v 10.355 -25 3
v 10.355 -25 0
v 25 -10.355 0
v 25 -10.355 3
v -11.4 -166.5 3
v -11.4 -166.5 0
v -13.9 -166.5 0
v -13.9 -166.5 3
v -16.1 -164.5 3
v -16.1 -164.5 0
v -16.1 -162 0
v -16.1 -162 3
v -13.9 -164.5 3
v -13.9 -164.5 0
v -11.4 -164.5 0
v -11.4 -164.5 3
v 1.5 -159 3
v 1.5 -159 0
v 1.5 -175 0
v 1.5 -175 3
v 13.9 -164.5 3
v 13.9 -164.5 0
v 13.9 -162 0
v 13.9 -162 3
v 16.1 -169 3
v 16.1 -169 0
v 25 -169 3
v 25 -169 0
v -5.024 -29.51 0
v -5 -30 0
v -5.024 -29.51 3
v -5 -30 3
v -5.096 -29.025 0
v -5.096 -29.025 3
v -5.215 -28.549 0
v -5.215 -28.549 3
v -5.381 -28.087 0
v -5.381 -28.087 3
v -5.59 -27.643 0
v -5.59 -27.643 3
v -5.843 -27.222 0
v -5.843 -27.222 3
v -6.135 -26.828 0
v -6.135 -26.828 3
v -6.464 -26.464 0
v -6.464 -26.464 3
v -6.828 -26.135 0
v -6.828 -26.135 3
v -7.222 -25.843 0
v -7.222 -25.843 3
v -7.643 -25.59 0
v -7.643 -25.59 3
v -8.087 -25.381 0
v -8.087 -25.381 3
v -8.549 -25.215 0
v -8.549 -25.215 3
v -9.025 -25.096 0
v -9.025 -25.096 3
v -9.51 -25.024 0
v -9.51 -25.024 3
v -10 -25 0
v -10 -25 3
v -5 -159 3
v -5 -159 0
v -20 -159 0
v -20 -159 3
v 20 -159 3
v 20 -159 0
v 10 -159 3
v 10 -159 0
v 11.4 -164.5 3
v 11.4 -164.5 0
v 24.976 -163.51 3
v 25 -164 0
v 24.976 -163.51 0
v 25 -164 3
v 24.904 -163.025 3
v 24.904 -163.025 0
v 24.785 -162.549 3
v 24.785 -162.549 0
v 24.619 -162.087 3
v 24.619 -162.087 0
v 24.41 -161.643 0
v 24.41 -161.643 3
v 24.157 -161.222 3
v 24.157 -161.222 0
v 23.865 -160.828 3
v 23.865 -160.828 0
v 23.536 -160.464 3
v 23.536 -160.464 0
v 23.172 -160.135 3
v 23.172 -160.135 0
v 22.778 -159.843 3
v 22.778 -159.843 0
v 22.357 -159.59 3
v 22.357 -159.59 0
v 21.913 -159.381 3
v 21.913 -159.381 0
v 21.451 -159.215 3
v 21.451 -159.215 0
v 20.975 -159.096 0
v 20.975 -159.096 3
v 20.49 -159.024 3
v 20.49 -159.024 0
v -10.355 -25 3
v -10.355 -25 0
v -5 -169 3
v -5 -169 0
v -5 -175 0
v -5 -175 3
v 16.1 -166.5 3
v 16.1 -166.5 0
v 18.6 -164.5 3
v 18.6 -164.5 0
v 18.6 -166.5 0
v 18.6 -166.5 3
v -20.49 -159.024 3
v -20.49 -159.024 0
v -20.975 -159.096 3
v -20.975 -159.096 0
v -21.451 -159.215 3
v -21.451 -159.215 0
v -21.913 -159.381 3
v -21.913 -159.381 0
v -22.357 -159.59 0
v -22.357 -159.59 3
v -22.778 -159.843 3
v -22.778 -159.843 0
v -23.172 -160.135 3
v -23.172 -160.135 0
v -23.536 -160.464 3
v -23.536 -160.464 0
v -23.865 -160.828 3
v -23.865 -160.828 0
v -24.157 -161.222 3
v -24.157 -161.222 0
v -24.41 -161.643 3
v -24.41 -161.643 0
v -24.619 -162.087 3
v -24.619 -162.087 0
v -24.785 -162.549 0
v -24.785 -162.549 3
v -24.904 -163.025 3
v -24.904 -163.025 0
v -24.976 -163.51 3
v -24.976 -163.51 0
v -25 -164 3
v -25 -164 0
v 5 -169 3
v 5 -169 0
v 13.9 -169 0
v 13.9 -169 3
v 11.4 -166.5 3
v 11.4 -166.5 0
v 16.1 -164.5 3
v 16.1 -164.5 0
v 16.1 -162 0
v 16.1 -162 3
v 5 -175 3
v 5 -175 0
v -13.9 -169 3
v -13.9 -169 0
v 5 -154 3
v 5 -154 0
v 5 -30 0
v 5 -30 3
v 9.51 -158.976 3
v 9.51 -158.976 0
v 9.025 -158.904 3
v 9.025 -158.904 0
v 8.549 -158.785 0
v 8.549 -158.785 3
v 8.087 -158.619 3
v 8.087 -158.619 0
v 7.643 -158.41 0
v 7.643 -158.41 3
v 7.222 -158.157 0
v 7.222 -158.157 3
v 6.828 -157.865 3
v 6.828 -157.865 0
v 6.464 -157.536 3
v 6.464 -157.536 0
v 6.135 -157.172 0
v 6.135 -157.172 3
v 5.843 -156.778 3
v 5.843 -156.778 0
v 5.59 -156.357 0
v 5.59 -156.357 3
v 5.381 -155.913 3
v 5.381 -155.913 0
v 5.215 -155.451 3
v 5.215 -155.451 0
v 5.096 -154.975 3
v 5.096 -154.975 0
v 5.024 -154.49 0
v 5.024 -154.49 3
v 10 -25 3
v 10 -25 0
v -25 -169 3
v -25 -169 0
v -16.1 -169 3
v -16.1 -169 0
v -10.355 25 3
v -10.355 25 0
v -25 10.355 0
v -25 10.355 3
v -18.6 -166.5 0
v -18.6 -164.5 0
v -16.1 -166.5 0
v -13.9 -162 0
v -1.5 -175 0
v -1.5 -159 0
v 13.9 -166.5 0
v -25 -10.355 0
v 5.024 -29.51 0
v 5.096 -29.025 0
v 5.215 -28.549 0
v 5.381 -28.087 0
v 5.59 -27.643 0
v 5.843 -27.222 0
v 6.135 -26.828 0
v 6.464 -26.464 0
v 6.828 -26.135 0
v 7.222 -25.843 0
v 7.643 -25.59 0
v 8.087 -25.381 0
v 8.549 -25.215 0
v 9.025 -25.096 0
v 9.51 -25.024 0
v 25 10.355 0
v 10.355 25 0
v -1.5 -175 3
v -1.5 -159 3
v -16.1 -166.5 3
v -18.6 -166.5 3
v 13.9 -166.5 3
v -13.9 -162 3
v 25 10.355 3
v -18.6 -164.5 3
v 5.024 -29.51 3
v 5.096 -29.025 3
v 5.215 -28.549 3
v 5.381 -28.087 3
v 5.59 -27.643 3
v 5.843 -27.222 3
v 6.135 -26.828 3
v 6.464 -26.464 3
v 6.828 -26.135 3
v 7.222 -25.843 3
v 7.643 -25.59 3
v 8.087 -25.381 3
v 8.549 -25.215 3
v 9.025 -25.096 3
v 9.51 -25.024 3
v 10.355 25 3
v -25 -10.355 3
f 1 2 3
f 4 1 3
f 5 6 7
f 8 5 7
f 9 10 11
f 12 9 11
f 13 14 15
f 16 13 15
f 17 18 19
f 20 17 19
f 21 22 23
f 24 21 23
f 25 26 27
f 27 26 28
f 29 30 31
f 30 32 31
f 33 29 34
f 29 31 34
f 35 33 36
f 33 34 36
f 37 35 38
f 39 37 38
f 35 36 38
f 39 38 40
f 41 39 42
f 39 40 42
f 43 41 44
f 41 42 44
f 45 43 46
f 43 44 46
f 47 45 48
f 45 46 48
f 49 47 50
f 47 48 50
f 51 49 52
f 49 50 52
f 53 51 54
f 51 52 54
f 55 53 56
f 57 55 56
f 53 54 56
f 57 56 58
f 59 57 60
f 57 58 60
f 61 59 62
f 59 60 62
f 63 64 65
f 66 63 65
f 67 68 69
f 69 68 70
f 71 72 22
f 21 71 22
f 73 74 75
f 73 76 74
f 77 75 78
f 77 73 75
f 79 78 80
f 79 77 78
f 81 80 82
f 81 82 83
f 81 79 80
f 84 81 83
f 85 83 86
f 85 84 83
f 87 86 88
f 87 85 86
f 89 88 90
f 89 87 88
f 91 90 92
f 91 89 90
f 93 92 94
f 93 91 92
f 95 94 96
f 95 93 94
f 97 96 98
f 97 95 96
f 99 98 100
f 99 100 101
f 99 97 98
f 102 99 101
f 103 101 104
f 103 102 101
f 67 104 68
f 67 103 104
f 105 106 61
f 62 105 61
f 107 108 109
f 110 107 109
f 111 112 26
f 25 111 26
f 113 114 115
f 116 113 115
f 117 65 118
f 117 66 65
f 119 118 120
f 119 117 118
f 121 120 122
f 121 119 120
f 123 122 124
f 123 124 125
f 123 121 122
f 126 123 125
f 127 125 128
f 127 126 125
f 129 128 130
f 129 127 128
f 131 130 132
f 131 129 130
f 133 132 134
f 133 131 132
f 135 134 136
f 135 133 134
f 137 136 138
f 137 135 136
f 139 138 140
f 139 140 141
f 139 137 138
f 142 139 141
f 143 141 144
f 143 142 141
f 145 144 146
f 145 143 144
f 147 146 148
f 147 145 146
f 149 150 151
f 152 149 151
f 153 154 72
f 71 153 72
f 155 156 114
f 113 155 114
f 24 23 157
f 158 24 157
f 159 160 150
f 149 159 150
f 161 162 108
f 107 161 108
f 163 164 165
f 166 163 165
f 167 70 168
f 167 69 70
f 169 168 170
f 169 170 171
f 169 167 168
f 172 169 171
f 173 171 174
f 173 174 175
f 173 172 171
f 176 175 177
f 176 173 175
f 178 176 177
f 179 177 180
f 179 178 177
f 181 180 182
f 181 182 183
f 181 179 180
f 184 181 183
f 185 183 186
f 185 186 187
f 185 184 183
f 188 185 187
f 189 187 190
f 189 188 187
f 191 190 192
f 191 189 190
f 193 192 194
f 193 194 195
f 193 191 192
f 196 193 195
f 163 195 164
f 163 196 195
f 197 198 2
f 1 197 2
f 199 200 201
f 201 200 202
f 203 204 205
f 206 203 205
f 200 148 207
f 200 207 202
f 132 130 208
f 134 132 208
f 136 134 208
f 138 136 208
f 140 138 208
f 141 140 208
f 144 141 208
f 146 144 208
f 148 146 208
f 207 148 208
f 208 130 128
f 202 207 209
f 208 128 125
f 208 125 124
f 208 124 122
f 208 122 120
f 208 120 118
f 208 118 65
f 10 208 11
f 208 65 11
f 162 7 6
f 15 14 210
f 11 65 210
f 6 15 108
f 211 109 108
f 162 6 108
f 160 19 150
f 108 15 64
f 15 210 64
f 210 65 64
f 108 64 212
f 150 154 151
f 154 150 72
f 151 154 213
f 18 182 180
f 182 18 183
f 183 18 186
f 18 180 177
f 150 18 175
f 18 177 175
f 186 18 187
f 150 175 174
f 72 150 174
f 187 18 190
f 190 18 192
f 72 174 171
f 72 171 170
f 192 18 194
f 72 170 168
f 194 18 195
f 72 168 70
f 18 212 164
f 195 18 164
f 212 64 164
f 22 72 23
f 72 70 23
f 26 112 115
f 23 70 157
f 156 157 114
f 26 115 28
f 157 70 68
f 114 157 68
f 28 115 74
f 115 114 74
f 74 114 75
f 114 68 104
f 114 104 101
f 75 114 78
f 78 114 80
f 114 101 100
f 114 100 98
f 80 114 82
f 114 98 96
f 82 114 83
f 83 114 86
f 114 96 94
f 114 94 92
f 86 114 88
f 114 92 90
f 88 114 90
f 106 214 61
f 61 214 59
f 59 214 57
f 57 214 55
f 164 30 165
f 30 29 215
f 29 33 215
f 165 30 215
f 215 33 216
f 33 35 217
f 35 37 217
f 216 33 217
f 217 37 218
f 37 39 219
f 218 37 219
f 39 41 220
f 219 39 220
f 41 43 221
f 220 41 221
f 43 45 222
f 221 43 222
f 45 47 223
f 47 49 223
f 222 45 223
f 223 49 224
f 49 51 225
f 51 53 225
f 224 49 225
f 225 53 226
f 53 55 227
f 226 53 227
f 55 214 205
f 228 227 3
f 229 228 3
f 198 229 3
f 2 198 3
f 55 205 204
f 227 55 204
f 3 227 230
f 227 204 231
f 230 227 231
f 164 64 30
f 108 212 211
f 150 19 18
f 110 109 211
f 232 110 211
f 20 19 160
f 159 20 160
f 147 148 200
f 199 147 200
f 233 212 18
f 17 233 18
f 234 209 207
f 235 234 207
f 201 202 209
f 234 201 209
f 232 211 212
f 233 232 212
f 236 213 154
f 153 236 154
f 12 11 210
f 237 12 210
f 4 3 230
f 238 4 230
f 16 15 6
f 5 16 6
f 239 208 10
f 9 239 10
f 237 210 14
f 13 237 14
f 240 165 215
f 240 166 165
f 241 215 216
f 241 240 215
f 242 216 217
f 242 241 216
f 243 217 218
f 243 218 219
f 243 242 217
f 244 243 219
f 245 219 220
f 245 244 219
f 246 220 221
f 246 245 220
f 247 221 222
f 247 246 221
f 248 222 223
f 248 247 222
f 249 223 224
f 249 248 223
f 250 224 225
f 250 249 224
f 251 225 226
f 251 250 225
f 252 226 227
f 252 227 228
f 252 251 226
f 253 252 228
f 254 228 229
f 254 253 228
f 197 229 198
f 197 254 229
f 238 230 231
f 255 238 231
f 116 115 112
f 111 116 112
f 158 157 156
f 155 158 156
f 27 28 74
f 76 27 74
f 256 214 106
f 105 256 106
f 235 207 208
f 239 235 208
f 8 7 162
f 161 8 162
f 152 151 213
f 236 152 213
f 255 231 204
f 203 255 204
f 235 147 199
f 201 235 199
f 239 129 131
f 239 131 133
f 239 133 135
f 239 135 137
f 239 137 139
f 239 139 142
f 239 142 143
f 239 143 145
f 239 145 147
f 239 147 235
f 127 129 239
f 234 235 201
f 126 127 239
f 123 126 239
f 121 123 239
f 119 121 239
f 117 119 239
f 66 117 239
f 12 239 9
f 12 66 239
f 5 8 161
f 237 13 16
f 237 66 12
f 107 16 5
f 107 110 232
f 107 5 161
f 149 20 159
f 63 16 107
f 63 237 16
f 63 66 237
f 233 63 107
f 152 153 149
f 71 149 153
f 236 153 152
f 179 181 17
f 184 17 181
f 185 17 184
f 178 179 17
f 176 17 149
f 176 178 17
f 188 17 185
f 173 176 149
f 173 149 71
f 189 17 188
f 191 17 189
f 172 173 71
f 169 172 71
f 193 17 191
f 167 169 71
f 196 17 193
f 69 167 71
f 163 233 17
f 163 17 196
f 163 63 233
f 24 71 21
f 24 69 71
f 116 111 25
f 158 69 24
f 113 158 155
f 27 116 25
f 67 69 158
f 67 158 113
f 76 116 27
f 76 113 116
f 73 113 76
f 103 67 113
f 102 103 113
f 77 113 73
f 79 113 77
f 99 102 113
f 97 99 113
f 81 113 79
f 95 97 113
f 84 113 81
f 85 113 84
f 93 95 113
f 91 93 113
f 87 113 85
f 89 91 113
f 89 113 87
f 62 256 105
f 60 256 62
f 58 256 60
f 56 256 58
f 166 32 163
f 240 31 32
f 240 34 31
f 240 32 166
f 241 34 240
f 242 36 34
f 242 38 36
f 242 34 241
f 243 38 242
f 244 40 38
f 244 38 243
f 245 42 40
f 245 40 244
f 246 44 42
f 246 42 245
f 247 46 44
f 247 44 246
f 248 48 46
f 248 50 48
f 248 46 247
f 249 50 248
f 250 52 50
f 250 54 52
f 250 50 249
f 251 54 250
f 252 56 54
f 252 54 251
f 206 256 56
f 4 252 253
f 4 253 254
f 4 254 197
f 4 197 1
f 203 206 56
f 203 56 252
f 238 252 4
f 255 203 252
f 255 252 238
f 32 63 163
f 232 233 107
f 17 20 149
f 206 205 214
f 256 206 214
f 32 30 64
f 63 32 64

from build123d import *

# Parameters (mm, degrees)
BOSS_EXTRUDE1_DEPTH = 3
FILLET1_R           = 5


with BuildPart() as part:
    # Sketch1 → Boss-Extrude1 (new body)
    with BuildSketch(Plane.XY):
        Polygon((-5, -25), (-5, -159), (-25, -159), (-25, -169), (-16.1, -169), (-16.1, -166.5), (-18.6, -166.5), (-18.6, -164.5), (-16.1, -164.5), (-16.1, -162), (-13.9, -162), (-13.9, -164.5), (-11.4, -164.5), (-11.4, -166.5), (-13.9, -166.5), (-13.9, -169), (-5, -169), (-5, -175), (-1.5, -175), (-1.5, -159), (1.5, -159), (1.5, -175), (5, -175), (5, -169), (13.9, -169), (13.9, -166.5), (11.4, -166.5), (11.4, -164.5), (13.9, -164.5), (13.9, -162), (16.1, -162), (16.1, -164.5), (18.6, -164.5), (18.6, -166.5), (16.1, -166.5), (16.1, -169), (25, -169), (25, -159), (5, -159), (5, -25), (10.355339059, -25), (25, -10.355339059), (25, 10.355339059), (10.355339059, 25), (-10.355339059, 25), (-25, 10.355339059), (-25, -10.355339059), (-10.355339059, -25), align=None)
    extrude(amount=BOSS_EXTRUDE1_DEPTH)

    # Fillet1
    fillet1_edges = [part.edges().sort_by_distance(p)[0] for p in [
        (5, -25, 1.5),
        (5, -159, 1.5),
        (25, -159, 1.5),
        (-25, -159, 1.5),
        (-5, -25, 1.5),
    ]]
    fillet(fillet1_edges, radius=FILLET1_R)


solid = part.part
